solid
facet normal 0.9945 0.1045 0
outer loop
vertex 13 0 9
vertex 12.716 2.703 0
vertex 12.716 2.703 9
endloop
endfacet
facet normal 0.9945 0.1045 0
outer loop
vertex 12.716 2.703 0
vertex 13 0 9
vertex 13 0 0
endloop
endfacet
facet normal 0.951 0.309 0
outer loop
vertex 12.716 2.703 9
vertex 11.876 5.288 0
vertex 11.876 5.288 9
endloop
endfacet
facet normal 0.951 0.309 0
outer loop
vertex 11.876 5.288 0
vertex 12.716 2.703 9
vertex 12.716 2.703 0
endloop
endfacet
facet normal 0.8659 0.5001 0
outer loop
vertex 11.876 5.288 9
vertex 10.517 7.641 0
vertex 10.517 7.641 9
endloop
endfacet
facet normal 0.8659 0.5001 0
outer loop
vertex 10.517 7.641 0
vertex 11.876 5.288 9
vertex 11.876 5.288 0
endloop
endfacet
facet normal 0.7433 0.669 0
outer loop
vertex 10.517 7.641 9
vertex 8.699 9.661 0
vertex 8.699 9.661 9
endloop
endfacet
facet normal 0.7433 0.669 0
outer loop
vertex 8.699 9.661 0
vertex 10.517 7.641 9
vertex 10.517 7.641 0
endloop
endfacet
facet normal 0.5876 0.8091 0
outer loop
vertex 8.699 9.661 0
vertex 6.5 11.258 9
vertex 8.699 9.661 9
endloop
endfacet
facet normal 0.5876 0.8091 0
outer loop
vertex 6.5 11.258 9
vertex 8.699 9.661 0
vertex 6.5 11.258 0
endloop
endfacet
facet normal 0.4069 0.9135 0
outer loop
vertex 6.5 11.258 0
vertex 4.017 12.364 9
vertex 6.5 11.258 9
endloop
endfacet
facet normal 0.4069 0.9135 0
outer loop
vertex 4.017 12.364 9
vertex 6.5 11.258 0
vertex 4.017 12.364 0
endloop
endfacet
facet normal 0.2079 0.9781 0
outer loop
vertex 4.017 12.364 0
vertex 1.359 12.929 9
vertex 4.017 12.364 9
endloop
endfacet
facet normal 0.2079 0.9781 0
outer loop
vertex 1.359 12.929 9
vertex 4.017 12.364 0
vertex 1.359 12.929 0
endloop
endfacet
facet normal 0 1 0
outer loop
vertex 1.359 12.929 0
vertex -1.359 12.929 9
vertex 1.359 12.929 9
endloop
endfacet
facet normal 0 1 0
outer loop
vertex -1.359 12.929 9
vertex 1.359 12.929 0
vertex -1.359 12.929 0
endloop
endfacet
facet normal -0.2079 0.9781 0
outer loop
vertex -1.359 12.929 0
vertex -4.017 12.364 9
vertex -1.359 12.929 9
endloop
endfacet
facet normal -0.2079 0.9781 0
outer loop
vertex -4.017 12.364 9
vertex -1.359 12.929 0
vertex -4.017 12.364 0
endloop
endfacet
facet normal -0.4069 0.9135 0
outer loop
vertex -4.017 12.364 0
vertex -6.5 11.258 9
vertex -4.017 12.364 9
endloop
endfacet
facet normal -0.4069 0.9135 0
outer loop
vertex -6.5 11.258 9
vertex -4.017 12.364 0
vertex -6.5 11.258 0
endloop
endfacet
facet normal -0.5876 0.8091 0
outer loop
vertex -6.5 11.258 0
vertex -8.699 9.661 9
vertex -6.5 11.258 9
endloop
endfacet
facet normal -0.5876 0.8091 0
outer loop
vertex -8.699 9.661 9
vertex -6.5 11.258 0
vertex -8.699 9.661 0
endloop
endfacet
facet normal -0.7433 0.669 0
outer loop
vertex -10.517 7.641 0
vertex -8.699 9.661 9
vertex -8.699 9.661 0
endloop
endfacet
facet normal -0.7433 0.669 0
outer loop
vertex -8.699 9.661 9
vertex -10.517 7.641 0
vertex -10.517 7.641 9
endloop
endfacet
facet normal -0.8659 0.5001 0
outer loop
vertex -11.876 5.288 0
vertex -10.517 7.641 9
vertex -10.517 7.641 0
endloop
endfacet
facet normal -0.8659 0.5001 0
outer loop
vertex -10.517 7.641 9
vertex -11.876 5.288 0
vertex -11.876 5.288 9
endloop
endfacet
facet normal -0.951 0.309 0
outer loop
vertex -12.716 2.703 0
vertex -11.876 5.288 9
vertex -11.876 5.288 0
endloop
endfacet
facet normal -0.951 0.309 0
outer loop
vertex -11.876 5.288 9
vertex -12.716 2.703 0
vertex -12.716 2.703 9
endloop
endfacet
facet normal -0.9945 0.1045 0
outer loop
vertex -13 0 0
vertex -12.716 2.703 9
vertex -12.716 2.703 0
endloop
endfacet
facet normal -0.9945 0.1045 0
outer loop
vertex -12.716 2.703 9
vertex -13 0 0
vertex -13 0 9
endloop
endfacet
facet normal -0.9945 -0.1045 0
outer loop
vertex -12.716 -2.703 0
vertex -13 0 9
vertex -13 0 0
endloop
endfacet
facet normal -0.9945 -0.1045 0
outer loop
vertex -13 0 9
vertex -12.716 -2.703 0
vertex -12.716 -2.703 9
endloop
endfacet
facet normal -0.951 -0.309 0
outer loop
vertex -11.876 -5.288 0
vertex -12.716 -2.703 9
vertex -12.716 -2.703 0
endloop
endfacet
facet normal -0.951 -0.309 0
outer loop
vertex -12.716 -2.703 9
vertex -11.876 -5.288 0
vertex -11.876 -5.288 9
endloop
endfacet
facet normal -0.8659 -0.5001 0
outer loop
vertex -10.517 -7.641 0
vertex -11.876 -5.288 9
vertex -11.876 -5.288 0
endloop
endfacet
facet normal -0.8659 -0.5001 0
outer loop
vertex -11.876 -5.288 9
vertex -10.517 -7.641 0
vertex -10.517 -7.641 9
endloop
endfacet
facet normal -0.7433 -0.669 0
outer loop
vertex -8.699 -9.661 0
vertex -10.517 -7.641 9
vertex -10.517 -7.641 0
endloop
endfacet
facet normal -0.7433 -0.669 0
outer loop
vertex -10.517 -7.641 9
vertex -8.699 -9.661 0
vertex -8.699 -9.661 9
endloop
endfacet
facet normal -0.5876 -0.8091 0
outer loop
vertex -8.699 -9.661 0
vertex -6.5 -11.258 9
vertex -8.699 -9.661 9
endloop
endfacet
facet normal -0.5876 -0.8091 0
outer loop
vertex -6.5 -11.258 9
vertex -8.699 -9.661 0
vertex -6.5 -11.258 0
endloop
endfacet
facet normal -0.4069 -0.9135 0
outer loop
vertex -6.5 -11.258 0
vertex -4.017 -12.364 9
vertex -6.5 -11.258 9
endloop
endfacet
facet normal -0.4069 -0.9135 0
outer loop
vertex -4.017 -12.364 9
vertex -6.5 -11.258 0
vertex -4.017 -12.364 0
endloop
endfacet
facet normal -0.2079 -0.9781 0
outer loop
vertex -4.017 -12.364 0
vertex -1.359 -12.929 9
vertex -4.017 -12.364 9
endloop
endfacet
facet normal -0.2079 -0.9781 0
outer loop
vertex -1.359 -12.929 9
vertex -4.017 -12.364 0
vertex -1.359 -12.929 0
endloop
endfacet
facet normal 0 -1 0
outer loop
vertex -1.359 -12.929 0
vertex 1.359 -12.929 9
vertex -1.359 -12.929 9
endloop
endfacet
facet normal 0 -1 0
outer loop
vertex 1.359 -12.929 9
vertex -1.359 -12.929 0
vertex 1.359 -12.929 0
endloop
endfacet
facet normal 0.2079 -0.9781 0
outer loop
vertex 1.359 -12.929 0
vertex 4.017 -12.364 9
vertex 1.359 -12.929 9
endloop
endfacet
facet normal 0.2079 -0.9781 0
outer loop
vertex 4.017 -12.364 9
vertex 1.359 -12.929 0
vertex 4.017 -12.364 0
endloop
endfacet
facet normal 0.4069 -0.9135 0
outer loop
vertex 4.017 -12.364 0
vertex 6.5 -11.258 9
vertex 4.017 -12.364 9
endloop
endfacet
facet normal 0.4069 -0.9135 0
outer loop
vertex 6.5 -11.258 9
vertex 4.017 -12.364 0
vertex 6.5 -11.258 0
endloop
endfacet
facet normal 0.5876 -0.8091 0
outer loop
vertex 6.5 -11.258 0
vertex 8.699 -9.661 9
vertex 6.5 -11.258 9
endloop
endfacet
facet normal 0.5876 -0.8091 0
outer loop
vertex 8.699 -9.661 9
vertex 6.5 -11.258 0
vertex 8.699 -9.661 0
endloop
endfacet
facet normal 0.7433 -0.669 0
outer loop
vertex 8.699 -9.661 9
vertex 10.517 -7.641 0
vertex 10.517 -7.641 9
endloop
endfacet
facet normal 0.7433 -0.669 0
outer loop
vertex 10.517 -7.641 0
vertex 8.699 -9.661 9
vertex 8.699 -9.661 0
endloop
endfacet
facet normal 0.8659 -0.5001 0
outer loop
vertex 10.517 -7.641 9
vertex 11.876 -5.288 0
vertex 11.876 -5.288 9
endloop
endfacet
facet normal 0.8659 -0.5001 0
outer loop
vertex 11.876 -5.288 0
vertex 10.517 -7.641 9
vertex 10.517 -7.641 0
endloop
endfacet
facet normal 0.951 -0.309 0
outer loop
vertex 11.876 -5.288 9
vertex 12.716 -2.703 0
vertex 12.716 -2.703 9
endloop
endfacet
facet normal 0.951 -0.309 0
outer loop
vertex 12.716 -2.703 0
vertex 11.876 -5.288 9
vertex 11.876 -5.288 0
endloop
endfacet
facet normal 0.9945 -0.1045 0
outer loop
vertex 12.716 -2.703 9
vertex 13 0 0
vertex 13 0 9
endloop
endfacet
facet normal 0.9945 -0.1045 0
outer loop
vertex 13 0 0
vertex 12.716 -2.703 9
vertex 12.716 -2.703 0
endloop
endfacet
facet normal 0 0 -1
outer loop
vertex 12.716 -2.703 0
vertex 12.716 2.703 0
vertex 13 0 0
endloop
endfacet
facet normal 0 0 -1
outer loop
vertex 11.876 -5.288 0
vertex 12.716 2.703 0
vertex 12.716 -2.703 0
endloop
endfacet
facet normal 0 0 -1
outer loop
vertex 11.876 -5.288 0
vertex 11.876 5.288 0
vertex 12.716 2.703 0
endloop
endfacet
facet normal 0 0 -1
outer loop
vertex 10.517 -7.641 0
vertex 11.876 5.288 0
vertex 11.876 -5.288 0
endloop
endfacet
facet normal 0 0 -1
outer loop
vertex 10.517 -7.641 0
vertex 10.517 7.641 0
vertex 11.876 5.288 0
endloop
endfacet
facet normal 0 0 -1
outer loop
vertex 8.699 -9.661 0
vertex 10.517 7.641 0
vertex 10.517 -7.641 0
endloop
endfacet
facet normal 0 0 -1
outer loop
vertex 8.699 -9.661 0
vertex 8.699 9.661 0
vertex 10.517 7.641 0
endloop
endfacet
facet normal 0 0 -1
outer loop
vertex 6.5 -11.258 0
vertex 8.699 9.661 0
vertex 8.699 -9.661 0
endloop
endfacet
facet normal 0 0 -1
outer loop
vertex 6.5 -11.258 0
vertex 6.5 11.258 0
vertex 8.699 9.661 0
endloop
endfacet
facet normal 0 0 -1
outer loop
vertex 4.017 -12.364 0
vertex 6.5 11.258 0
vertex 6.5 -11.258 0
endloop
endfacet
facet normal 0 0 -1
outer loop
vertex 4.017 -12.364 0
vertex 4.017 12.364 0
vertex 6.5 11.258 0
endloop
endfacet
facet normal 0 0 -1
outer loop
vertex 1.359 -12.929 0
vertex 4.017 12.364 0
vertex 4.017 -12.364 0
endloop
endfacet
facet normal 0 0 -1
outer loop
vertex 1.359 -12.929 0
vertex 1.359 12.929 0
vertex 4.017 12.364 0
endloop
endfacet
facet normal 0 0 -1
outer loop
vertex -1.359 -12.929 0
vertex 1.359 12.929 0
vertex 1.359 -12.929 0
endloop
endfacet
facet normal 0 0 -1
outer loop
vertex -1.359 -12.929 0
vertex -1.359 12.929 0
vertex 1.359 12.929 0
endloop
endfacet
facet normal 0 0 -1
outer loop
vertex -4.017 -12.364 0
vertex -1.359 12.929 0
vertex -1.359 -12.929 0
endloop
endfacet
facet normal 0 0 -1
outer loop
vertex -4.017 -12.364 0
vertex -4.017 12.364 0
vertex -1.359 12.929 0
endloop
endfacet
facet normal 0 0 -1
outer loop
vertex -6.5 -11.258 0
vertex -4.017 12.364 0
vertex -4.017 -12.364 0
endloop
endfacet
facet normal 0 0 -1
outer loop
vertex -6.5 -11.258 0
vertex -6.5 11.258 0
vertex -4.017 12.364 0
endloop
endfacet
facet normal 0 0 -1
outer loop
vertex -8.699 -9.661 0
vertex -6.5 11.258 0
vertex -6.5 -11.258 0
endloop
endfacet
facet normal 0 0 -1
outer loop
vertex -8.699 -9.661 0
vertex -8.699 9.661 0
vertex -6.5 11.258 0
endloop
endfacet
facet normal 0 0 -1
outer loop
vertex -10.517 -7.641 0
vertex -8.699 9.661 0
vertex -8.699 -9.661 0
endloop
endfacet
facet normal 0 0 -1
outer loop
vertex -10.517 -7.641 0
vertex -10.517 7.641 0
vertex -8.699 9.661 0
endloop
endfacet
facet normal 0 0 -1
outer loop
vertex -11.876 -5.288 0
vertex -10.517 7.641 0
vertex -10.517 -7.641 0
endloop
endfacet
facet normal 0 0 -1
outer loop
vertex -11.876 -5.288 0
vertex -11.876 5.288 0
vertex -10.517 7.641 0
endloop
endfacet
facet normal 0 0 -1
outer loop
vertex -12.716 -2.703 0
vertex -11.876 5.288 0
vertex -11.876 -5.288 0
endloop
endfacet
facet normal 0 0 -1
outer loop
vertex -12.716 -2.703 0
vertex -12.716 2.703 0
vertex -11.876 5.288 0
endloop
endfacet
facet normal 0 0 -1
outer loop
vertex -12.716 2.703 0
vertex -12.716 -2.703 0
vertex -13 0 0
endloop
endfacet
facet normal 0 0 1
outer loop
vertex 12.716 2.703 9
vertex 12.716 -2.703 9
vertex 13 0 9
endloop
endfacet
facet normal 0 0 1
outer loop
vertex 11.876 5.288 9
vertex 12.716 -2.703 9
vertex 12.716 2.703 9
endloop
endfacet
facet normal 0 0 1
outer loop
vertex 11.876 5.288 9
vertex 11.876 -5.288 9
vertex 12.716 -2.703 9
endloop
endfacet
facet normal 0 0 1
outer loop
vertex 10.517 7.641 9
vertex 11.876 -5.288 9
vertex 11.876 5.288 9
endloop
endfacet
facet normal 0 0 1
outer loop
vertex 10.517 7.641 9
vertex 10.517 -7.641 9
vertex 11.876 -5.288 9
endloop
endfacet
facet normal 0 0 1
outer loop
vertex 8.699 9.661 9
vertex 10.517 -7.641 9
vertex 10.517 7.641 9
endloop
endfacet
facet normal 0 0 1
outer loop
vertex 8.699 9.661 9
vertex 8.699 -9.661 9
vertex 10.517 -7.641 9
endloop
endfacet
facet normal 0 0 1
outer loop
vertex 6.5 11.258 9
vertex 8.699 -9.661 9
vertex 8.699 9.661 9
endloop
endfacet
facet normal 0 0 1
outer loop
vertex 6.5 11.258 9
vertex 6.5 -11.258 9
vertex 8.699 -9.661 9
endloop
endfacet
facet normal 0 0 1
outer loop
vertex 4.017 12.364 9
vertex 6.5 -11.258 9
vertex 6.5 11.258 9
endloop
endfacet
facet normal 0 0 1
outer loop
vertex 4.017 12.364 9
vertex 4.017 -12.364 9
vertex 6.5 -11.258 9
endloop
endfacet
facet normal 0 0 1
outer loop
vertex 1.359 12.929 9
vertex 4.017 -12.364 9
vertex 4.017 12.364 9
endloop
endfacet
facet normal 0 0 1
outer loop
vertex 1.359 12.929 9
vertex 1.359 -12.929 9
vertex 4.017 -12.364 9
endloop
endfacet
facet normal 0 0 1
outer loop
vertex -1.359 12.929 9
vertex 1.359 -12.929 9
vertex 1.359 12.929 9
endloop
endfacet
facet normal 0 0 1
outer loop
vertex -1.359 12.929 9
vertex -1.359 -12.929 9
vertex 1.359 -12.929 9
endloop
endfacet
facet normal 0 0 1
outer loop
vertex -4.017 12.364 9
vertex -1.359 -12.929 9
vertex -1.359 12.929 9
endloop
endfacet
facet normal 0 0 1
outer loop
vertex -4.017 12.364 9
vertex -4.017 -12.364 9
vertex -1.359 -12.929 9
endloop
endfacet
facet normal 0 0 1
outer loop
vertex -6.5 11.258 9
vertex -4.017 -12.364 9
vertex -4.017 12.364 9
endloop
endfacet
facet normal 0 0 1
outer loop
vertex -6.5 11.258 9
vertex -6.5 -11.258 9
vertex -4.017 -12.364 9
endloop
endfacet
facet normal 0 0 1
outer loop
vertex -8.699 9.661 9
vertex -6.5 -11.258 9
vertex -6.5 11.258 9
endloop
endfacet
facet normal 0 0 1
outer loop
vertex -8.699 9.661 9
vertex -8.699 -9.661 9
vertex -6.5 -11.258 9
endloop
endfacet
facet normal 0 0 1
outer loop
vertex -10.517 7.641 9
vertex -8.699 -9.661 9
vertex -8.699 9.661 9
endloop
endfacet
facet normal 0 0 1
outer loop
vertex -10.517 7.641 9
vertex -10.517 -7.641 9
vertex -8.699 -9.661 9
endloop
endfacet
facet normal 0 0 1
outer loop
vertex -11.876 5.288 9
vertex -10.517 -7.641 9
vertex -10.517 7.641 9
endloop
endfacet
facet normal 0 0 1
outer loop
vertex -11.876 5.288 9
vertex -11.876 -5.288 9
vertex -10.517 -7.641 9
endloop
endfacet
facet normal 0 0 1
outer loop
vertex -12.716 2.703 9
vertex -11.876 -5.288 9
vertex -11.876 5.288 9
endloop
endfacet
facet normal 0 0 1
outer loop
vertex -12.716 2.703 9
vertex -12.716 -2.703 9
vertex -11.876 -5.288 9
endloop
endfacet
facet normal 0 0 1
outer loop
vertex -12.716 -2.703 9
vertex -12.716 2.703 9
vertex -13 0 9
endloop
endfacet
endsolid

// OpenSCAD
// Generated by SolidPython 1.0.1 on 2020-07-29 00:46:44


cylinder(h = 9, r1 = 13, r2 = 13);
/***********************************************
*********      SolidPython code:      **********
************************************************
 
# import packages: SolidPython
from solid import *
from solid.utils import *
from itertools import chain, combinations, permutations


class Resize:

    def __init__(self, scad_file):
        self.scad_file = scad_file
        #self.scad_file = import_scad(scad_file)
        # cone/cylinder param:
        self.r1 = 0
        self.r2 = 0
        self.h = 0
        # rectangular prism param:
        self.w = 0
        self.l = 0
        # ellipse param:
        self.r = 0

    # import OpenScad code (file name corresponds to shape)


    # classify shape + parameters
    def assign(self, param1, param2, param3):
        if self.scad_file == 'cone.scad':
            self.r1 = param1
            self.r2 = param2
            self.h = param3
        elif self.scad_file == 'cylinder.scad':
            self.r1 = param1
            self.r2 = param2
            self.h = param3
        elif self.scad_file == 'rectangularPrism.scad':
            self.h = param1
            self.l = param2
            self.w = param3
        else:
            self.r = param1
            self.h = param2

    # resize parameters
    def iterate(self):
        x = range(3, 20, 2)
        i = 1
        if self.scad_file == 'cone.scad':
            tempList = list(permutations(x, 2))
            for temp in tempList:
                param1 = temp[0]
                param2 = temp[1]
                filepath = 'produced_scad_files/' + 'cone' + str(param1) + '_' + str(param2) + '_' + '.scad'
                scad_render_to_file(cylinder(h=param1, r1=param2, r2=0), filepath)

        elif self.scad_file == 'cylinder.scad':
            tempList = list(permutations(x, 3))
            for temp in tempList:
                param1 = temp[0]
                param2 = temp[1]
                filepath = 'produced_scad_files/' + 'cylinder' + str(param1) + '_' + str(param2) + '_' + '.scad'
                scad_render_to_file(cylinder(h=param1, r1=param2, r2=param2), filepath)

        elif self.scad_file == 'rectangularPrism.scad':
            tempList = list(permutations(x, 3))
            for temp in tempList:
                param1 = temp[0]
                param2 = temp[1]
                param3 = temp[2]
                filepath = 'produced_scad_files/' + 'rectangularPrism' + str(param1) + '_' + str(param2) + '_' + str(
                    param3) + '.scad'
                scad_render_to_file(cube(size=(param1, param2, param3)), filepath)

        elif self.scad_file == 'ellipse.scad':
            tempList = list(permutations(x, 4))
            for temp in tempList:
                param1 = temp[0]
                param2 = temp[1]
                param3 = temp[2]
                param4 = temp[3]
                filepath = 'produced_scad_files/' + 'ellipse' + str(param1) + '_' + str(param2) + '_' + str(param3) + '_' + str(param4) + '.scad'
                scad_render_to_file(scale([param1, param2, param3])(sphere(r=param4)), filepath)

    def render_to_scadfile(self):
        scad_render_to_file(scad, 'example.scad') 
 
************************************************/
